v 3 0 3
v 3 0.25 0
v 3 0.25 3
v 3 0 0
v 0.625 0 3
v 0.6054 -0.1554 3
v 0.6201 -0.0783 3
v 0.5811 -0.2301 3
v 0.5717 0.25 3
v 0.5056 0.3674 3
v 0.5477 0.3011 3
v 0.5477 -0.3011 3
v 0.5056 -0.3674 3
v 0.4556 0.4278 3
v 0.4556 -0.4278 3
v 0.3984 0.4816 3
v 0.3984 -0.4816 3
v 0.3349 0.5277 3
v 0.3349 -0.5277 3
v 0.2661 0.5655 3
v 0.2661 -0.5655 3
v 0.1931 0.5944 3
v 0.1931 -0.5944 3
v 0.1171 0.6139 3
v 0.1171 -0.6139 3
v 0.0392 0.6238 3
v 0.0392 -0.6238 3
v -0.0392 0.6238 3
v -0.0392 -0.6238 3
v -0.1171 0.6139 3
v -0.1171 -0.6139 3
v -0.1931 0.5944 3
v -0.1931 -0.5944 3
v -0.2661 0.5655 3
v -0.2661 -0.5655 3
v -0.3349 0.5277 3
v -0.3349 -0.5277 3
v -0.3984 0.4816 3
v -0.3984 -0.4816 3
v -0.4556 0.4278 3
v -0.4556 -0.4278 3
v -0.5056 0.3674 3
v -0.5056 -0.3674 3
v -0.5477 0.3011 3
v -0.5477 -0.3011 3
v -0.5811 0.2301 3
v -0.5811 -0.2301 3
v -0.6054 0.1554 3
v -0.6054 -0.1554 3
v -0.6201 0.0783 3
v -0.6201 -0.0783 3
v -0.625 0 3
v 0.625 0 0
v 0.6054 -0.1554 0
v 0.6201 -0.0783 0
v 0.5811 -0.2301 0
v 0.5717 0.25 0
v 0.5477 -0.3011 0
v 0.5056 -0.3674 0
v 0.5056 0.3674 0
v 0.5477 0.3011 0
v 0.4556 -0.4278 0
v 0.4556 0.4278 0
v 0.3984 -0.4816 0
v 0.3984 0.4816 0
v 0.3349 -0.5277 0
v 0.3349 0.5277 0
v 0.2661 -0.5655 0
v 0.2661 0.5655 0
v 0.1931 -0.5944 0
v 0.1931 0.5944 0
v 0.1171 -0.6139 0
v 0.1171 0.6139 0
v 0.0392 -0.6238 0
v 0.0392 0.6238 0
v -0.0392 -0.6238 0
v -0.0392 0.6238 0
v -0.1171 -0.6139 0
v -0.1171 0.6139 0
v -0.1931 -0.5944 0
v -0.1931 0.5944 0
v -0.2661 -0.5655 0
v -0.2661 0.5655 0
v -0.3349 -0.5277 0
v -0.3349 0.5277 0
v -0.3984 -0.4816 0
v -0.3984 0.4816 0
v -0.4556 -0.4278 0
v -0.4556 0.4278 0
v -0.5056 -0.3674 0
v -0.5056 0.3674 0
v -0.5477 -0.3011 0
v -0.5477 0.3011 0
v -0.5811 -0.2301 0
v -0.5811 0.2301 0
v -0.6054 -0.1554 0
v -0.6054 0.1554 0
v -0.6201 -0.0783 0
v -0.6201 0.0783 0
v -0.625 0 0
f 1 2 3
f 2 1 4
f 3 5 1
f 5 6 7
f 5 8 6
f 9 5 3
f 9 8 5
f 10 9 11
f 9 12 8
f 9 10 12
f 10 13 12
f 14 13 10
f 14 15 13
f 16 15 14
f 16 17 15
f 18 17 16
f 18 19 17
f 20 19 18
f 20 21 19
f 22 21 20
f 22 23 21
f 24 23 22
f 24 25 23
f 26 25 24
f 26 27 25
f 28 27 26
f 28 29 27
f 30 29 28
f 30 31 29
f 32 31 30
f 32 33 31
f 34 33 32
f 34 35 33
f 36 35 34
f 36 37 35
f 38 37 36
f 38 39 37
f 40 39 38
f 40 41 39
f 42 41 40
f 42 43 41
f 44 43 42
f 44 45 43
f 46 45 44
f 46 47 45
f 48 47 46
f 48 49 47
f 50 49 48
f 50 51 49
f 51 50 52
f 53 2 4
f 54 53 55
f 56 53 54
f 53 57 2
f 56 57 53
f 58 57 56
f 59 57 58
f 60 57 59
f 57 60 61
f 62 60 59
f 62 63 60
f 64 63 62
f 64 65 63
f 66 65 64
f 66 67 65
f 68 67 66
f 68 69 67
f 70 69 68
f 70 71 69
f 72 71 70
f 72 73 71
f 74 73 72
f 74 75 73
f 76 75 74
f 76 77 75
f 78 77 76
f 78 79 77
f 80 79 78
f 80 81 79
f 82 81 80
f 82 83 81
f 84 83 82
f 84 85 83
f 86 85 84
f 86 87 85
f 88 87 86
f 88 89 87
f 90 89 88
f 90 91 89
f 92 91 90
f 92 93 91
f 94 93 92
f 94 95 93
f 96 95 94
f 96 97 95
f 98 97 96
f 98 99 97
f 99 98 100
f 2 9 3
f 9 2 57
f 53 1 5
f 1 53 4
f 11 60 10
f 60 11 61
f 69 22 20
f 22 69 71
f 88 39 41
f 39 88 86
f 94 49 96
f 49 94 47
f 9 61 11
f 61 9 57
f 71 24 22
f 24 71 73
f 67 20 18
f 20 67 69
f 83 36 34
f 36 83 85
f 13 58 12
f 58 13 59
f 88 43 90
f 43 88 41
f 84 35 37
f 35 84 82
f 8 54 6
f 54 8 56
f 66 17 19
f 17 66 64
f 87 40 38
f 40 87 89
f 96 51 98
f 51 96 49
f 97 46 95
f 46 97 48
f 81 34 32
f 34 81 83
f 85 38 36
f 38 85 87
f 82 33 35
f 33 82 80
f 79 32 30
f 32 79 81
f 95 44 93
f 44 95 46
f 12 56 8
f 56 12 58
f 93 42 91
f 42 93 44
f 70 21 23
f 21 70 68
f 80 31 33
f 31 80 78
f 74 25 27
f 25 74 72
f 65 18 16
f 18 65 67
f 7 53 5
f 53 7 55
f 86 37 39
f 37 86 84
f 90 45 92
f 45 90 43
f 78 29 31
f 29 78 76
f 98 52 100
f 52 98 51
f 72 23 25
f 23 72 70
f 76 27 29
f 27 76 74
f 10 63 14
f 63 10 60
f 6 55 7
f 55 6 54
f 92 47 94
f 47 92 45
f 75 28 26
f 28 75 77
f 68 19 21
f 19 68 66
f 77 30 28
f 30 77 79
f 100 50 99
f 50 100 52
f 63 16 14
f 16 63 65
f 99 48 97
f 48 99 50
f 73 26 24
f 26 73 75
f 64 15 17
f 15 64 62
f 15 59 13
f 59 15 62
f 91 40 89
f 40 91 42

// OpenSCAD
//Written by Ryan Branch on 7/8/2017
//Default values are listed in inches

//Special variables:
$fn = 50;

//User-defined parameters:
    //TURNTABLE SPECIFICATIONS
    turntable_width = 3.000;
    turntable_thickness = 0.390;
    turntable_top_hole_spacing = 2.560;
    turntable_top_hole_diameter = 0.160;
    turntable_bottom_hole_spacing = 2.560;
    turntable_bottom_hole_diameter = 0.160;
    turntable_central_hole_diameter = 2.710;
    //MOTOR SPECIFICATIONS
    motor_width = 1.700;
    motor_body_height = 1.950;
    motor_raised_circle_height = 0.090;
    motor_raised_circle_diameter = 0.880;
    motor_hole_spacing = 1.220;
    motor_hole_diameter = 0.160;
    motor_shaft_length = 0.945;
    motor_shaft_diameter = 0.208;
	motor_wire_exit_width = 0.510;
    motor_wire_exit_height = 0.510;
    //Thickness of extra space for sliding wire between motor wall and part wall
    motor_wire_clearance_width = 0.250;
    //The distance above the motor face plate that any component sticks out
    motor_clearance_height = 0.2;
    //FASTENER SPECIFICATIONS
    outside_bottom_nut_thickness = 0.080;
    outside_bottom_nut_largest_diameter = 0.270;
    inside_bottom_nut_thickness = 0.080;
    inside_bottom_nut_largest_diameter = 0.270;
    top_nut_thickness = 0.080;
    top_nut_largest_diameter = 0.270;

//Writer-defined parameters:
    //BOTTOM PARAMETERS
    
    //LOWER BRACKET PARAMETERS
    //horizontal thicknesses
    hthick_lower_bracket_walls = 0.500;
    
    //UPPER BRACKET PARAMETERS
    //vertical thicknesses
    vthick_bottom_plate = 0.250;
    vthick_upper_bracket_plate = 0.125;
    vthick_top_plate = 0.250;
    vthick_space_below_coupler = 0.100;
    //"below" refers to after the part has been flipped over 180 degrees
    vthick_below_vents = 0.250;
    //horizontal thicknesses
    hthick_shaft_coupler_ring = 0.125;
    hthick_shaft_coupler_panel = 0.100;
    hthick_shaft_coupler_gap = 0.03;
    //other
    shaft_coupler_panel_length = 0.300;
    shaft_coupler_hole_diameter = 0.160;
    
    //TOP PARAMETERS
    //vertical thicknesses
    vthick_stops = 0.125;
    
    //horizontal thicknesses
    hthick_top = 0.250;
    hthick_space_between_plates = 0.063;
    hthick_plates = 0.250;
    hthick_space_between_stops = 0.125;
    hthick_stops = 0.125;
    //other
    height_plates = 0.750;
    //The inner diameter of the curve is equal to this multiplier times hthick_top
    inner_diameter_multiplier = 3;
    

//PART 5: Top, with Grip

//main base
cube([turntable_width, hthick_top, turntable_width]);

//cylinder which becomes semicircular wall
translate([0,0,,
           0]) {
    cylinder(turntable_width,
             hthick_top * (inner_diameter_multiplier + 2) / 2,
             hthick_top * (inner_diameter_multiplier + 2) / 2);
}
